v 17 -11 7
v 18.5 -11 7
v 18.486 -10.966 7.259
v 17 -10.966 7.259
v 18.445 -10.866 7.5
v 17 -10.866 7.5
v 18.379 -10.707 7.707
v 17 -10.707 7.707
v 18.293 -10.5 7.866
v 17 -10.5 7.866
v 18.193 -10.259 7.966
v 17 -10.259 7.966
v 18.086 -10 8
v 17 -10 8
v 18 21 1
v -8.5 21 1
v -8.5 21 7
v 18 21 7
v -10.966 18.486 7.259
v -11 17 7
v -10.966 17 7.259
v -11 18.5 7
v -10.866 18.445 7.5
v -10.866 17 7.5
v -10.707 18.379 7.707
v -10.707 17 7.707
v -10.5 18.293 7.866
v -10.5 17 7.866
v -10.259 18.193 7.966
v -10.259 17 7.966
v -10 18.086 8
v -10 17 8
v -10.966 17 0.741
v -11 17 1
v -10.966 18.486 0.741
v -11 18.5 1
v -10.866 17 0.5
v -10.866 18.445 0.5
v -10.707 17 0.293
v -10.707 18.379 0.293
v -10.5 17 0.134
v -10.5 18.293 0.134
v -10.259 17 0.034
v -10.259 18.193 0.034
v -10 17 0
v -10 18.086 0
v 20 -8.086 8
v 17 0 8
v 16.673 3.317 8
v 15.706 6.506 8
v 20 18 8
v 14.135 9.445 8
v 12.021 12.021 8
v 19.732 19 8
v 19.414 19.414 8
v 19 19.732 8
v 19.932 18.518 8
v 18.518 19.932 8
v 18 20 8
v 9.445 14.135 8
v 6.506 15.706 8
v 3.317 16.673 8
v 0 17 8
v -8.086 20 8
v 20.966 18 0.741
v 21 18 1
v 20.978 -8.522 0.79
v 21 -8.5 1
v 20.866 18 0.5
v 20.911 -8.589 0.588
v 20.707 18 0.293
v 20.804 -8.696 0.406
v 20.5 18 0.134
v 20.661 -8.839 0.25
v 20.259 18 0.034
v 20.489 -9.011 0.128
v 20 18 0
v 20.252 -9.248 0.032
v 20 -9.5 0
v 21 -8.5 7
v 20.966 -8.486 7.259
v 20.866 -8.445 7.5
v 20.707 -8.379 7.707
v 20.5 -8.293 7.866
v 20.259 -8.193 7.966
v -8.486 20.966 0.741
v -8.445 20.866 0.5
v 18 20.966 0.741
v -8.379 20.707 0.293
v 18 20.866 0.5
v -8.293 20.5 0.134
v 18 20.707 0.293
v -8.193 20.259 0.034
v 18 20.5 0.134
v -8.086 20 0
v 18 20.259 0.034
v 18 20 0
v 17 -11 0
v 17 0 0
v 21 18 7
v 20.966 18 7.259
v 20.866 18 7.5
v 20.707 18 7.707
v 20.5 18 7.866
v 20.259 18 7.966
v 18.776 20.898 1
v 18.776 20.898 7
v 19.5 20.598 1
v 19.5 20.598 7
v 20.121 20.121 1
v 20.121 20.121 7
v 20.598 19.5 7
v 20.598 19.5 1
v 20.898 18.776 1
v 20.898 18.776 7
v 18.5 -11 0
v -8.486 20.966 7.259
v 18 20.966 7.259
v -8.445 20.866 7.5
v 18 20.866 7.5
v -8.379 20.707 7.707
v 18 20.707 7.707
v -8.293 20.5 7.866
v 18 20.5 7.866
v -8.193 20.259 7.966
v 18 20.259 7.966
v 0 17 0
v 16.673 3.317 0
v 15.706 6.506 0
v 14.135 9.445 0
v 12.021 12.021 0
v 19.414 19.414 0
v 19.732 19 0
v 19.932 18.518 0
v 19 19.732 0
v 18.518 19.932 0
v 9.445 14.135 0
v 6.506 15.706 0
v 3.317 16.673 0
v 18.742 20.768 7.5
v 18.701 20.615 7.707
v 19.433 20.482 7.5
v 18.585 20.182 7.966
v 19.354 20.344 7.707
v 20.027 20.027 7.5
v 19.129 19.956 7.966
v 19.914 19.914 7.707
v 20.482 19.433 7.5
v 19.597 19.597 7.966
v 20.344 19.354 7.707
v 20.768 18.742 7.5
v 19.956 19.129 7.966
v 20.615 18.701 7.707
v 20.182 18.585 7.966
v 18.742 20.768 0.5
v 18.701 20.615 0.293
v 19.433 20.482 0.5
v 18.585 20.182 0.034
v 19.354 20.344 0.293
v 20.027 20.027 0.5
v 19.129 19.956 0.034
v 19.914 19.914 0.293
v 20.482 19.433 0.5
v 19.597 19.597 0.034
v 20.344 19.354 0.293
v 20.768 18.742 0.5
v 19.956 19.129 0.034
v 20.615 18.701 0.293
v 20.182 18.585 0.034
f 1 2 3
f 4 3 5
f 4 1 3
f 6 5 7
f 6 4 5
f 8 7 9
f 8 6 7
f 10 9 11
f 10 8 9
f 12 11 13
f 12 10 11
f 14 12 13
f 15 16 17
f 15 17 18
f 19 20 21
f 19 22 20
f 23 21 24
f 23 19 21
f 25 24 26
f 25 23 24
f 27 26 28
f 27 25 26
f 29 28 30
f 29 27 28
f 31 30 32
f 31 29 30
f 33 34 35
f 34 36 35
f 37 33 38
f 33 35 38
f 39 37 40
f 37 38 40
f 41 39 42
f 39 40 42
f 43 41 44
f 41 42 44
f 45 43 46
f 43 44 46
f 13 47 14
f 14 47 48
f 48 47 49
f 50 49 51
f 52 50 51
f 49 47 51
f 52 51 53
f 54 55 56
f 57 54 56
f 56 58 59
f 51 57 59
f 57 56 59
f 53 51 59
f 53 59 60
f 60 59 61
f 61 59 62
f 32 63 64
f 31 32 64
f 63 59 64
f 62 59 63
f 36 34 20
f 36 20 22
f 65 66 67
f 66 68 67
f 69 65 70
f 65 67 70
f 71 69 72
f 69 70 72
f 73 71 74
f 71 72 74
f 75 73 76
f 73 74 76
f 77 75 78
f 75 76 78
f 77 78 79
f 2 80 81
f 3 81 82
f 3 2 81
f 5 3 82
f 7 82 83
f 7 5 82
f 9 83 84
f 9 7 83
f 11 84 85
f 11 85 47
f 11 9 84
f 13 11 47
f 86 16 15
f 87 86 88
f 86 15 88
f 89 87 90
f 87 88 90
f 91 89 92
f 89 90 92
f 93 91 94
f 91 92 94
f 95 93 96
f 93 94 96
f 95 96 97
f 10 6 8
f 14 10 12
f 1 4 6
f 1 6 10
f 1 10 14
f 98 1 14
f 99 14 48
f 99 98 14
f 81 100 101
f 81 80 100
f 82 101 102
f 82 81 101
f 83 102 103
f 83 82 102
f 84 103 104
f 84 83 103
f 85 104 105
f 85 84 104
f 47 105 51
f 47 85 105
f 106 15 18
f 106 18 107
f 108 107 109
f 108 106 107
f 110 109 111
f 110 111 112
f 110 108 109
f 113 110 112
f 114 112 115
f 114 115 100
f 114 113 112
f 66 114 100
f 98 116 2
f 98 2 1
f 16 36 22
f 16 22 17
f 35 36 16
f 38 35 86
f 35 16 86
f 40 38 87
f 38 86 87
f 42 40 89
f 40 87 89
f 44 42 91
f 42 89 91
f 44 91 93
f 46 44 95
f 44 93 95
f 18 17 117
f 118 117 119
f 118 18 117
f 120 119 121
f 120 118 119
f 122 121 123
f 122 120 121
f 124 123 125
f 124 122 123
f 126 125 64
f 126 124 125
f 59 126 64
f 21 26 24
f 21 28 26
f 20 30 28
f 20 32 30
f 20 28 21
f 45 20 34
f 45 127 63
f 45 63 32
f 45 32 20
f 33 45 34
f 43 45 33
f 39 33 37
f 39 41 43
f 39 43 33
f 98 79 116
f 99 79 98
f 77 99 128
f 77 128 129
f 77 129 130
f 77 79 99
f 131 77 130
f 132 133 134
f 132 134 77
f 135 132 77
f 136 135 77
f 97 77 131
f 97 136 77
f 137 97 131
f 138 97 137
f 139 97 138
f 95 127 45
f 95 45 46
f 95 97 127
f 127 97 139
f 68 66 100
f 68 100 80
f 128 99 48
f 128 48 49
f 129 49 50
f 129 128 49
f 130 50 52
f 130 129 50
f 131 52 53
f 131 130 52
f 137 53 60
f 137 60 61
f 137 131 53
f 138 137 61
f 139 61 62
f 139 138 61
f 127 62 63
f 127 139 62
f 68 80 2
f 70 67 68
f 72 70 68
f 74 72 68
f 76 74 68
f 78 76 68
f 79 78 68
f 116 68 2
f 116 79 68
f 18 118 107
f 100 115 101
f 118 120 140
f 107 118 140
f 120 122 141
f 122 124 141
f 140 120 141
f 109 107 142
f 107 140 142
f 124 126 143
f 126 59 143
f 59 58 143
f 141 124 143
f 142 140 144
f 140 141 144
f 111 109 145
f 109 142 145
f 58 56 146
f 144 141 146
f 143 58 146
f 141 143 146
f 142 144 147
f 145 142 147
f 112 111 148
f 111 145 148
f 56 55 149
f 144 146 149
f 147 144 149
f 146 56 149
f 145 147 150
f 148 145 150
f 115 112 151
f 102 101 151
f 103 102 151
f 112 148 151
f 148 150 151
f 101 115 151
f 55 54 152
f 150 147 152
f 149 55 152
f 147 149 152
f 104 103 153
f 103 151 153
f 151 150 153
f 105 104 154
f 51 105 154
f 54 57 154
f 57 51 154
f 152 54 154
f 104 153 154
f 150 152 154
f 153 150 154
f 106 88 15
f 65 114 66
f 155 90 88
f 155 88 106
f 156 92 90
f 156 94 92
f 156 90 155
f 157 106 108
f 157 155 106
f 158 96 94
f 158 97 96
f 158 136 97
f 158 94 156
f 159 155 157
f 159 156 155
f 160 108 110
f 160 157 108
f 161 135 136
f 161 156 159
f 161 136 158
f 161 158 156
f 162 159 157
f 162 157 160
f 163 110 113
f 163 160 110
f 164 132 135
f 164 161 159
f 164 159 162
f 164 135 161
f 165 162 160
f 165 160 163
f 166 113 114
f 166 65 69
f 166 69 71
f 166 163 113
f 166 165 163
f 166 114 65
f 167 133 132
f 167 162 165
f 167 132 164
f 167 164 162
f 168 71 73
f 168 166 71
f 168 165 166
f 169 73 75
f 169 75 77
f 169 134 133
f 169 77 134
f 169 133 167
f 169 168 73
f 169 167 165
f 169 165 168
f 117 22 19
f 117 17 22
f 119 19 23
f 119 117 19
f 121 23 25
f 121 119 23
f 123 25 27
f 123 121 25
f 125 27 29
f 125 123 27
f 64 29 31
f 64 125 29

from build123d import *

# Parameters (mm, degrees)
EXTRUDE_1_DEPTH = 8
FILLET_1_R      = 1


with BuildPart() as part:
    # Эскиз1 → Бобышка-Вытянуть1 (new body)
    with BuildSketch(Plane.XY):
        with BuildLine():
            Line((-8.5, 21), (18, 21))
            ThreePointArc((18, 21), (20.121320344, 20.121320344), (21, 18))
            Line((21, 18), (21, -8.5))
            Line((21, -8.5), (18.5, -11))
            Line((18.5, -11), (17, -11))
            Line((17, -11), (17, 0))
            ThreePointArc((17, 0), (12.02081528, 12.02081528), (0, 17))
            Line((0, 17), (-11, 17))
            Line((-11, 17), (-11, 18.5))
            Line((-11, 18.5), (-8.5, 21))
        make_face()
    extrude(amount=EXTRUDE_1_DEPTH)

    # Скругление1
    fillet_1_edges = [part.edges().sort_by_distance(p)[0] for p in [
        (21, 4.75, 0),
        (-11, 17.75, 0),
        (-9.75, 19.75, 0),
        (17.75, -11, 8),
        (19.75, -9.75, 8),
        (21, 4.75, 8),
        (20.121320344, 20.121320344, 8),
        (4.75, 21, 8),
        (-9.75, 19.75, 8),
        (-11, 17.75, 8),
        (4.75, 21, 0),
        (20.121320344, 20.121320344, 0),
    ]]
    fillet(fillet_1_edges, radius=FILLET_1_R)


solid = part.part
